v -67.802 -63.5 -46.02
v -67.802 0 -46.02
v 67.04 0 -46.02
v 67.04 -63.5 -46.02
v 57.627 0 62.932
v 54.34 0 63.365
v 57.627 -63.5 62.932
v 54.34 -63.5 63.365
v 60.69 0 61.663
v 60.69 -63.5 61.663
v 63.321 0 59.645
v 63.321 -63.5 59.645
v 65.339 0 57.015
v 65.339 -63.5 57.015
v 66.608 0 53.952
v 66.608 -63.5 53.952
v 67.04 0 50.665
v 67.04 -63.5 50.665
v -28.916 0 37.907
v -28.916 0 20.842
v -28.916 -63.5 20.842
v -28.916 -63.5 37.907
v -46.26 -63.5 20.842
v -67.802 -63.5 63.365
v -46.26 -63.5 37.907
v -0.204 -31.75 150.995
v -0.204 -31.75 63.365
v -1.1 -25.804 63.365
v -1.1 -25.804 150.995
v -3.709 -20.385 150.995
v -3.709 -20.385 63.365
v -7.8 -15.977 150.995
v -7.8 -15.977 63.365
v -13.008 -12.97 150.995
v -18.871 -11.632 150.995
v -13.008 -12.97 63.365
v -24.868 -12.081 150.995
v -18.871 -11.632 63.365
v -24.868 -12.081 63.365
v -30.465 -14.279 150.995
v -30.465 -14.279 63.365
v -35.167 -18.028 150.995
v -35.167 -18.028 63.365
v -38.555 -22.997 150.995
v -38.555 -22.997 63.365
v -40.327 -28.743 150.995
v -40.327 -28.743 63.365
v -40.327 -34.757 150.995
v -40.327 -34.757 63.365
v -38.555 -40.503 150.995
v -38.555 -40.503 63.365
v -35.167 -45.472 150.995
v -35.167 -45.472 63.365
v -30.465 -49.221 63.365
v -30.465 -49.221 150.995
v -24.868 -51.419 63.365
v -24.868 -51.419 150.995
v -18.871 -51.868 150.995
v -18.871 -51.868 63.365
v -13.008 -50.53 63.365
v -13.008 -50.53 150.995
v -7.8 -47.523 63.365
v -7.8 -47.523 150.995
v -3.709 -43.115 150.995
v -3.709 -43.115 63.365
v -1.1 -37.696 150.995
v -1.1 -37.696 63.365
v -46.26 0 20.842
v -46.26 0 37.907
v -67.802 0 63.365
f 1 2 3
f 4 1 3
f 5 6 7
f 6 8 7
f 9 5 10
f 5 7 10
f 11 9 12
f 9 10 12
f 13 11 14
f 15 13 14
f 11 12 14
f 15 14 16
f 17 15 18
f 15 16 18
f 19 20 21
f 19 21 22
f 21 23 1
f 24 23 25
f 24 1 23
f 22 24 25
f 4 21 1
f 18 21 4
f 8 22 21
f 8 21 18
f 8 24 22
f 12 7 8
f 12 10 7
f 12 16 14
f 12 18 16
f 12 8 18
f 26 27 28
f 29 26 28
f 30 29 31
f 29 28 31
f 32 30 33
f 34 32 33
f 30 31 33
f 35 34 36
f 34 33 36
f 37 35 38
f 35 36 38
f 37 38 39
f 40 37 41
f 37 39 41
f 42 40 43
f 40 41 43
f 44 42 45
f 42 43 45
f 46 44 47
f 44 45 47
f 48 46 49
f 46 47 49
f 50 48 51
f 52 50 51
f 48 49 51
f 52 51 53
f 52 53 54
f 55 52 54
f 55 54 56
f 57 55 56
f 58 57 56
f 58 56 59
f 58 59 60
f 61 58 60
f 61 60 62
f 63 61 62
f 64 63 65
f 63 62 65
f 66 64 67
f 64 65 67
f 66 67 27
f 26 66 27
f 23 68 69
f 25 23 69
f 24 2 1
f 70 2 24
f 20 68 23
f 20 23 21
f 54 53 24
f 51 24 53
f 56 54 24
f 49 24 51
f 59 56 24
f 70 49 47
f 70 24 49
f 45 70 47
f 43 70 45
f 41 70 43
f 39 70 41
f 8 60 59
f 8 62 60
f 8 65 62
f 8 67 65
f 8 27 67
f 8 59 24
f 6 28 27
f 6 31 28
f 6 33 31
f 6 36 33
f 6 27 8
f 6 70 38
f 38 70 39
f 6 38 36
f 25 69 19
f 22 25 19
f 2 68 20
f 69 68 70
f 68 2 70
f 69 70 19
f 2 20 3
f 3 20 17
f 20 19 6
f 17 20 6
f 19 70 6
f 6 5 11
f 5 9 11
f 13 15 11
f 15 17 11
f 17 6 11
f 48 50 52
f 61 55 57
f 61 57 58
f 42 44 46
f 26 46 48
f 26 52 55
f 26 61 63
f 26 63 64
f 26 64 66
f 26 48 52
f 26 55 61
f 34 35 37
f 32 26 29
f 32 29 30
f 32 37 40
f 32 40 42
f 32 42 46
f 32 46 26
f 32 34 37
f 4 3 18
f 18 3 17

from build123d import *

# Parameters (mm, degrees)
F0_W     = 134.842023
F0_H     = 109.384302
F0_W_2   = 17.344825
F0_H_2   = 17.065071
F1_DEPTH = 63.5
F2_R     = 12.7
F3_R     = 20.174327
F4_DEPTH = 87.63


with BuildPart() as f1:
    # F0 (on Front) → F1 (new body)
    with BuildSketch(Plane.XZ):
        with Locations((-0.380561, 8.672414)):
            Rectangle(F0_W, F0_H)
        with Locations((-37.588007, 29.374301)):
            Rectangle(F0_W_2, F0_H_2, mode=Mode.SUBTRACT)
    extrude(amount=F1_DEPTH)

    # F2
    f2_edges = [f1.edges().sort_by_distance(p)[0] for p in [
        (67.040451, -31.75, 63.364565),
    ]]
    fillet(f2_edges, radius=F2_R)

    # F3 (on face) → F4 (join)
    with BuildSketch(Plane.XY.offset(63.364565)):
        with Locations((-20.378303, -31.75)):
            Circle(F3_R)
    extrude(amount=F4_DEPTH)


solid = f1.part
